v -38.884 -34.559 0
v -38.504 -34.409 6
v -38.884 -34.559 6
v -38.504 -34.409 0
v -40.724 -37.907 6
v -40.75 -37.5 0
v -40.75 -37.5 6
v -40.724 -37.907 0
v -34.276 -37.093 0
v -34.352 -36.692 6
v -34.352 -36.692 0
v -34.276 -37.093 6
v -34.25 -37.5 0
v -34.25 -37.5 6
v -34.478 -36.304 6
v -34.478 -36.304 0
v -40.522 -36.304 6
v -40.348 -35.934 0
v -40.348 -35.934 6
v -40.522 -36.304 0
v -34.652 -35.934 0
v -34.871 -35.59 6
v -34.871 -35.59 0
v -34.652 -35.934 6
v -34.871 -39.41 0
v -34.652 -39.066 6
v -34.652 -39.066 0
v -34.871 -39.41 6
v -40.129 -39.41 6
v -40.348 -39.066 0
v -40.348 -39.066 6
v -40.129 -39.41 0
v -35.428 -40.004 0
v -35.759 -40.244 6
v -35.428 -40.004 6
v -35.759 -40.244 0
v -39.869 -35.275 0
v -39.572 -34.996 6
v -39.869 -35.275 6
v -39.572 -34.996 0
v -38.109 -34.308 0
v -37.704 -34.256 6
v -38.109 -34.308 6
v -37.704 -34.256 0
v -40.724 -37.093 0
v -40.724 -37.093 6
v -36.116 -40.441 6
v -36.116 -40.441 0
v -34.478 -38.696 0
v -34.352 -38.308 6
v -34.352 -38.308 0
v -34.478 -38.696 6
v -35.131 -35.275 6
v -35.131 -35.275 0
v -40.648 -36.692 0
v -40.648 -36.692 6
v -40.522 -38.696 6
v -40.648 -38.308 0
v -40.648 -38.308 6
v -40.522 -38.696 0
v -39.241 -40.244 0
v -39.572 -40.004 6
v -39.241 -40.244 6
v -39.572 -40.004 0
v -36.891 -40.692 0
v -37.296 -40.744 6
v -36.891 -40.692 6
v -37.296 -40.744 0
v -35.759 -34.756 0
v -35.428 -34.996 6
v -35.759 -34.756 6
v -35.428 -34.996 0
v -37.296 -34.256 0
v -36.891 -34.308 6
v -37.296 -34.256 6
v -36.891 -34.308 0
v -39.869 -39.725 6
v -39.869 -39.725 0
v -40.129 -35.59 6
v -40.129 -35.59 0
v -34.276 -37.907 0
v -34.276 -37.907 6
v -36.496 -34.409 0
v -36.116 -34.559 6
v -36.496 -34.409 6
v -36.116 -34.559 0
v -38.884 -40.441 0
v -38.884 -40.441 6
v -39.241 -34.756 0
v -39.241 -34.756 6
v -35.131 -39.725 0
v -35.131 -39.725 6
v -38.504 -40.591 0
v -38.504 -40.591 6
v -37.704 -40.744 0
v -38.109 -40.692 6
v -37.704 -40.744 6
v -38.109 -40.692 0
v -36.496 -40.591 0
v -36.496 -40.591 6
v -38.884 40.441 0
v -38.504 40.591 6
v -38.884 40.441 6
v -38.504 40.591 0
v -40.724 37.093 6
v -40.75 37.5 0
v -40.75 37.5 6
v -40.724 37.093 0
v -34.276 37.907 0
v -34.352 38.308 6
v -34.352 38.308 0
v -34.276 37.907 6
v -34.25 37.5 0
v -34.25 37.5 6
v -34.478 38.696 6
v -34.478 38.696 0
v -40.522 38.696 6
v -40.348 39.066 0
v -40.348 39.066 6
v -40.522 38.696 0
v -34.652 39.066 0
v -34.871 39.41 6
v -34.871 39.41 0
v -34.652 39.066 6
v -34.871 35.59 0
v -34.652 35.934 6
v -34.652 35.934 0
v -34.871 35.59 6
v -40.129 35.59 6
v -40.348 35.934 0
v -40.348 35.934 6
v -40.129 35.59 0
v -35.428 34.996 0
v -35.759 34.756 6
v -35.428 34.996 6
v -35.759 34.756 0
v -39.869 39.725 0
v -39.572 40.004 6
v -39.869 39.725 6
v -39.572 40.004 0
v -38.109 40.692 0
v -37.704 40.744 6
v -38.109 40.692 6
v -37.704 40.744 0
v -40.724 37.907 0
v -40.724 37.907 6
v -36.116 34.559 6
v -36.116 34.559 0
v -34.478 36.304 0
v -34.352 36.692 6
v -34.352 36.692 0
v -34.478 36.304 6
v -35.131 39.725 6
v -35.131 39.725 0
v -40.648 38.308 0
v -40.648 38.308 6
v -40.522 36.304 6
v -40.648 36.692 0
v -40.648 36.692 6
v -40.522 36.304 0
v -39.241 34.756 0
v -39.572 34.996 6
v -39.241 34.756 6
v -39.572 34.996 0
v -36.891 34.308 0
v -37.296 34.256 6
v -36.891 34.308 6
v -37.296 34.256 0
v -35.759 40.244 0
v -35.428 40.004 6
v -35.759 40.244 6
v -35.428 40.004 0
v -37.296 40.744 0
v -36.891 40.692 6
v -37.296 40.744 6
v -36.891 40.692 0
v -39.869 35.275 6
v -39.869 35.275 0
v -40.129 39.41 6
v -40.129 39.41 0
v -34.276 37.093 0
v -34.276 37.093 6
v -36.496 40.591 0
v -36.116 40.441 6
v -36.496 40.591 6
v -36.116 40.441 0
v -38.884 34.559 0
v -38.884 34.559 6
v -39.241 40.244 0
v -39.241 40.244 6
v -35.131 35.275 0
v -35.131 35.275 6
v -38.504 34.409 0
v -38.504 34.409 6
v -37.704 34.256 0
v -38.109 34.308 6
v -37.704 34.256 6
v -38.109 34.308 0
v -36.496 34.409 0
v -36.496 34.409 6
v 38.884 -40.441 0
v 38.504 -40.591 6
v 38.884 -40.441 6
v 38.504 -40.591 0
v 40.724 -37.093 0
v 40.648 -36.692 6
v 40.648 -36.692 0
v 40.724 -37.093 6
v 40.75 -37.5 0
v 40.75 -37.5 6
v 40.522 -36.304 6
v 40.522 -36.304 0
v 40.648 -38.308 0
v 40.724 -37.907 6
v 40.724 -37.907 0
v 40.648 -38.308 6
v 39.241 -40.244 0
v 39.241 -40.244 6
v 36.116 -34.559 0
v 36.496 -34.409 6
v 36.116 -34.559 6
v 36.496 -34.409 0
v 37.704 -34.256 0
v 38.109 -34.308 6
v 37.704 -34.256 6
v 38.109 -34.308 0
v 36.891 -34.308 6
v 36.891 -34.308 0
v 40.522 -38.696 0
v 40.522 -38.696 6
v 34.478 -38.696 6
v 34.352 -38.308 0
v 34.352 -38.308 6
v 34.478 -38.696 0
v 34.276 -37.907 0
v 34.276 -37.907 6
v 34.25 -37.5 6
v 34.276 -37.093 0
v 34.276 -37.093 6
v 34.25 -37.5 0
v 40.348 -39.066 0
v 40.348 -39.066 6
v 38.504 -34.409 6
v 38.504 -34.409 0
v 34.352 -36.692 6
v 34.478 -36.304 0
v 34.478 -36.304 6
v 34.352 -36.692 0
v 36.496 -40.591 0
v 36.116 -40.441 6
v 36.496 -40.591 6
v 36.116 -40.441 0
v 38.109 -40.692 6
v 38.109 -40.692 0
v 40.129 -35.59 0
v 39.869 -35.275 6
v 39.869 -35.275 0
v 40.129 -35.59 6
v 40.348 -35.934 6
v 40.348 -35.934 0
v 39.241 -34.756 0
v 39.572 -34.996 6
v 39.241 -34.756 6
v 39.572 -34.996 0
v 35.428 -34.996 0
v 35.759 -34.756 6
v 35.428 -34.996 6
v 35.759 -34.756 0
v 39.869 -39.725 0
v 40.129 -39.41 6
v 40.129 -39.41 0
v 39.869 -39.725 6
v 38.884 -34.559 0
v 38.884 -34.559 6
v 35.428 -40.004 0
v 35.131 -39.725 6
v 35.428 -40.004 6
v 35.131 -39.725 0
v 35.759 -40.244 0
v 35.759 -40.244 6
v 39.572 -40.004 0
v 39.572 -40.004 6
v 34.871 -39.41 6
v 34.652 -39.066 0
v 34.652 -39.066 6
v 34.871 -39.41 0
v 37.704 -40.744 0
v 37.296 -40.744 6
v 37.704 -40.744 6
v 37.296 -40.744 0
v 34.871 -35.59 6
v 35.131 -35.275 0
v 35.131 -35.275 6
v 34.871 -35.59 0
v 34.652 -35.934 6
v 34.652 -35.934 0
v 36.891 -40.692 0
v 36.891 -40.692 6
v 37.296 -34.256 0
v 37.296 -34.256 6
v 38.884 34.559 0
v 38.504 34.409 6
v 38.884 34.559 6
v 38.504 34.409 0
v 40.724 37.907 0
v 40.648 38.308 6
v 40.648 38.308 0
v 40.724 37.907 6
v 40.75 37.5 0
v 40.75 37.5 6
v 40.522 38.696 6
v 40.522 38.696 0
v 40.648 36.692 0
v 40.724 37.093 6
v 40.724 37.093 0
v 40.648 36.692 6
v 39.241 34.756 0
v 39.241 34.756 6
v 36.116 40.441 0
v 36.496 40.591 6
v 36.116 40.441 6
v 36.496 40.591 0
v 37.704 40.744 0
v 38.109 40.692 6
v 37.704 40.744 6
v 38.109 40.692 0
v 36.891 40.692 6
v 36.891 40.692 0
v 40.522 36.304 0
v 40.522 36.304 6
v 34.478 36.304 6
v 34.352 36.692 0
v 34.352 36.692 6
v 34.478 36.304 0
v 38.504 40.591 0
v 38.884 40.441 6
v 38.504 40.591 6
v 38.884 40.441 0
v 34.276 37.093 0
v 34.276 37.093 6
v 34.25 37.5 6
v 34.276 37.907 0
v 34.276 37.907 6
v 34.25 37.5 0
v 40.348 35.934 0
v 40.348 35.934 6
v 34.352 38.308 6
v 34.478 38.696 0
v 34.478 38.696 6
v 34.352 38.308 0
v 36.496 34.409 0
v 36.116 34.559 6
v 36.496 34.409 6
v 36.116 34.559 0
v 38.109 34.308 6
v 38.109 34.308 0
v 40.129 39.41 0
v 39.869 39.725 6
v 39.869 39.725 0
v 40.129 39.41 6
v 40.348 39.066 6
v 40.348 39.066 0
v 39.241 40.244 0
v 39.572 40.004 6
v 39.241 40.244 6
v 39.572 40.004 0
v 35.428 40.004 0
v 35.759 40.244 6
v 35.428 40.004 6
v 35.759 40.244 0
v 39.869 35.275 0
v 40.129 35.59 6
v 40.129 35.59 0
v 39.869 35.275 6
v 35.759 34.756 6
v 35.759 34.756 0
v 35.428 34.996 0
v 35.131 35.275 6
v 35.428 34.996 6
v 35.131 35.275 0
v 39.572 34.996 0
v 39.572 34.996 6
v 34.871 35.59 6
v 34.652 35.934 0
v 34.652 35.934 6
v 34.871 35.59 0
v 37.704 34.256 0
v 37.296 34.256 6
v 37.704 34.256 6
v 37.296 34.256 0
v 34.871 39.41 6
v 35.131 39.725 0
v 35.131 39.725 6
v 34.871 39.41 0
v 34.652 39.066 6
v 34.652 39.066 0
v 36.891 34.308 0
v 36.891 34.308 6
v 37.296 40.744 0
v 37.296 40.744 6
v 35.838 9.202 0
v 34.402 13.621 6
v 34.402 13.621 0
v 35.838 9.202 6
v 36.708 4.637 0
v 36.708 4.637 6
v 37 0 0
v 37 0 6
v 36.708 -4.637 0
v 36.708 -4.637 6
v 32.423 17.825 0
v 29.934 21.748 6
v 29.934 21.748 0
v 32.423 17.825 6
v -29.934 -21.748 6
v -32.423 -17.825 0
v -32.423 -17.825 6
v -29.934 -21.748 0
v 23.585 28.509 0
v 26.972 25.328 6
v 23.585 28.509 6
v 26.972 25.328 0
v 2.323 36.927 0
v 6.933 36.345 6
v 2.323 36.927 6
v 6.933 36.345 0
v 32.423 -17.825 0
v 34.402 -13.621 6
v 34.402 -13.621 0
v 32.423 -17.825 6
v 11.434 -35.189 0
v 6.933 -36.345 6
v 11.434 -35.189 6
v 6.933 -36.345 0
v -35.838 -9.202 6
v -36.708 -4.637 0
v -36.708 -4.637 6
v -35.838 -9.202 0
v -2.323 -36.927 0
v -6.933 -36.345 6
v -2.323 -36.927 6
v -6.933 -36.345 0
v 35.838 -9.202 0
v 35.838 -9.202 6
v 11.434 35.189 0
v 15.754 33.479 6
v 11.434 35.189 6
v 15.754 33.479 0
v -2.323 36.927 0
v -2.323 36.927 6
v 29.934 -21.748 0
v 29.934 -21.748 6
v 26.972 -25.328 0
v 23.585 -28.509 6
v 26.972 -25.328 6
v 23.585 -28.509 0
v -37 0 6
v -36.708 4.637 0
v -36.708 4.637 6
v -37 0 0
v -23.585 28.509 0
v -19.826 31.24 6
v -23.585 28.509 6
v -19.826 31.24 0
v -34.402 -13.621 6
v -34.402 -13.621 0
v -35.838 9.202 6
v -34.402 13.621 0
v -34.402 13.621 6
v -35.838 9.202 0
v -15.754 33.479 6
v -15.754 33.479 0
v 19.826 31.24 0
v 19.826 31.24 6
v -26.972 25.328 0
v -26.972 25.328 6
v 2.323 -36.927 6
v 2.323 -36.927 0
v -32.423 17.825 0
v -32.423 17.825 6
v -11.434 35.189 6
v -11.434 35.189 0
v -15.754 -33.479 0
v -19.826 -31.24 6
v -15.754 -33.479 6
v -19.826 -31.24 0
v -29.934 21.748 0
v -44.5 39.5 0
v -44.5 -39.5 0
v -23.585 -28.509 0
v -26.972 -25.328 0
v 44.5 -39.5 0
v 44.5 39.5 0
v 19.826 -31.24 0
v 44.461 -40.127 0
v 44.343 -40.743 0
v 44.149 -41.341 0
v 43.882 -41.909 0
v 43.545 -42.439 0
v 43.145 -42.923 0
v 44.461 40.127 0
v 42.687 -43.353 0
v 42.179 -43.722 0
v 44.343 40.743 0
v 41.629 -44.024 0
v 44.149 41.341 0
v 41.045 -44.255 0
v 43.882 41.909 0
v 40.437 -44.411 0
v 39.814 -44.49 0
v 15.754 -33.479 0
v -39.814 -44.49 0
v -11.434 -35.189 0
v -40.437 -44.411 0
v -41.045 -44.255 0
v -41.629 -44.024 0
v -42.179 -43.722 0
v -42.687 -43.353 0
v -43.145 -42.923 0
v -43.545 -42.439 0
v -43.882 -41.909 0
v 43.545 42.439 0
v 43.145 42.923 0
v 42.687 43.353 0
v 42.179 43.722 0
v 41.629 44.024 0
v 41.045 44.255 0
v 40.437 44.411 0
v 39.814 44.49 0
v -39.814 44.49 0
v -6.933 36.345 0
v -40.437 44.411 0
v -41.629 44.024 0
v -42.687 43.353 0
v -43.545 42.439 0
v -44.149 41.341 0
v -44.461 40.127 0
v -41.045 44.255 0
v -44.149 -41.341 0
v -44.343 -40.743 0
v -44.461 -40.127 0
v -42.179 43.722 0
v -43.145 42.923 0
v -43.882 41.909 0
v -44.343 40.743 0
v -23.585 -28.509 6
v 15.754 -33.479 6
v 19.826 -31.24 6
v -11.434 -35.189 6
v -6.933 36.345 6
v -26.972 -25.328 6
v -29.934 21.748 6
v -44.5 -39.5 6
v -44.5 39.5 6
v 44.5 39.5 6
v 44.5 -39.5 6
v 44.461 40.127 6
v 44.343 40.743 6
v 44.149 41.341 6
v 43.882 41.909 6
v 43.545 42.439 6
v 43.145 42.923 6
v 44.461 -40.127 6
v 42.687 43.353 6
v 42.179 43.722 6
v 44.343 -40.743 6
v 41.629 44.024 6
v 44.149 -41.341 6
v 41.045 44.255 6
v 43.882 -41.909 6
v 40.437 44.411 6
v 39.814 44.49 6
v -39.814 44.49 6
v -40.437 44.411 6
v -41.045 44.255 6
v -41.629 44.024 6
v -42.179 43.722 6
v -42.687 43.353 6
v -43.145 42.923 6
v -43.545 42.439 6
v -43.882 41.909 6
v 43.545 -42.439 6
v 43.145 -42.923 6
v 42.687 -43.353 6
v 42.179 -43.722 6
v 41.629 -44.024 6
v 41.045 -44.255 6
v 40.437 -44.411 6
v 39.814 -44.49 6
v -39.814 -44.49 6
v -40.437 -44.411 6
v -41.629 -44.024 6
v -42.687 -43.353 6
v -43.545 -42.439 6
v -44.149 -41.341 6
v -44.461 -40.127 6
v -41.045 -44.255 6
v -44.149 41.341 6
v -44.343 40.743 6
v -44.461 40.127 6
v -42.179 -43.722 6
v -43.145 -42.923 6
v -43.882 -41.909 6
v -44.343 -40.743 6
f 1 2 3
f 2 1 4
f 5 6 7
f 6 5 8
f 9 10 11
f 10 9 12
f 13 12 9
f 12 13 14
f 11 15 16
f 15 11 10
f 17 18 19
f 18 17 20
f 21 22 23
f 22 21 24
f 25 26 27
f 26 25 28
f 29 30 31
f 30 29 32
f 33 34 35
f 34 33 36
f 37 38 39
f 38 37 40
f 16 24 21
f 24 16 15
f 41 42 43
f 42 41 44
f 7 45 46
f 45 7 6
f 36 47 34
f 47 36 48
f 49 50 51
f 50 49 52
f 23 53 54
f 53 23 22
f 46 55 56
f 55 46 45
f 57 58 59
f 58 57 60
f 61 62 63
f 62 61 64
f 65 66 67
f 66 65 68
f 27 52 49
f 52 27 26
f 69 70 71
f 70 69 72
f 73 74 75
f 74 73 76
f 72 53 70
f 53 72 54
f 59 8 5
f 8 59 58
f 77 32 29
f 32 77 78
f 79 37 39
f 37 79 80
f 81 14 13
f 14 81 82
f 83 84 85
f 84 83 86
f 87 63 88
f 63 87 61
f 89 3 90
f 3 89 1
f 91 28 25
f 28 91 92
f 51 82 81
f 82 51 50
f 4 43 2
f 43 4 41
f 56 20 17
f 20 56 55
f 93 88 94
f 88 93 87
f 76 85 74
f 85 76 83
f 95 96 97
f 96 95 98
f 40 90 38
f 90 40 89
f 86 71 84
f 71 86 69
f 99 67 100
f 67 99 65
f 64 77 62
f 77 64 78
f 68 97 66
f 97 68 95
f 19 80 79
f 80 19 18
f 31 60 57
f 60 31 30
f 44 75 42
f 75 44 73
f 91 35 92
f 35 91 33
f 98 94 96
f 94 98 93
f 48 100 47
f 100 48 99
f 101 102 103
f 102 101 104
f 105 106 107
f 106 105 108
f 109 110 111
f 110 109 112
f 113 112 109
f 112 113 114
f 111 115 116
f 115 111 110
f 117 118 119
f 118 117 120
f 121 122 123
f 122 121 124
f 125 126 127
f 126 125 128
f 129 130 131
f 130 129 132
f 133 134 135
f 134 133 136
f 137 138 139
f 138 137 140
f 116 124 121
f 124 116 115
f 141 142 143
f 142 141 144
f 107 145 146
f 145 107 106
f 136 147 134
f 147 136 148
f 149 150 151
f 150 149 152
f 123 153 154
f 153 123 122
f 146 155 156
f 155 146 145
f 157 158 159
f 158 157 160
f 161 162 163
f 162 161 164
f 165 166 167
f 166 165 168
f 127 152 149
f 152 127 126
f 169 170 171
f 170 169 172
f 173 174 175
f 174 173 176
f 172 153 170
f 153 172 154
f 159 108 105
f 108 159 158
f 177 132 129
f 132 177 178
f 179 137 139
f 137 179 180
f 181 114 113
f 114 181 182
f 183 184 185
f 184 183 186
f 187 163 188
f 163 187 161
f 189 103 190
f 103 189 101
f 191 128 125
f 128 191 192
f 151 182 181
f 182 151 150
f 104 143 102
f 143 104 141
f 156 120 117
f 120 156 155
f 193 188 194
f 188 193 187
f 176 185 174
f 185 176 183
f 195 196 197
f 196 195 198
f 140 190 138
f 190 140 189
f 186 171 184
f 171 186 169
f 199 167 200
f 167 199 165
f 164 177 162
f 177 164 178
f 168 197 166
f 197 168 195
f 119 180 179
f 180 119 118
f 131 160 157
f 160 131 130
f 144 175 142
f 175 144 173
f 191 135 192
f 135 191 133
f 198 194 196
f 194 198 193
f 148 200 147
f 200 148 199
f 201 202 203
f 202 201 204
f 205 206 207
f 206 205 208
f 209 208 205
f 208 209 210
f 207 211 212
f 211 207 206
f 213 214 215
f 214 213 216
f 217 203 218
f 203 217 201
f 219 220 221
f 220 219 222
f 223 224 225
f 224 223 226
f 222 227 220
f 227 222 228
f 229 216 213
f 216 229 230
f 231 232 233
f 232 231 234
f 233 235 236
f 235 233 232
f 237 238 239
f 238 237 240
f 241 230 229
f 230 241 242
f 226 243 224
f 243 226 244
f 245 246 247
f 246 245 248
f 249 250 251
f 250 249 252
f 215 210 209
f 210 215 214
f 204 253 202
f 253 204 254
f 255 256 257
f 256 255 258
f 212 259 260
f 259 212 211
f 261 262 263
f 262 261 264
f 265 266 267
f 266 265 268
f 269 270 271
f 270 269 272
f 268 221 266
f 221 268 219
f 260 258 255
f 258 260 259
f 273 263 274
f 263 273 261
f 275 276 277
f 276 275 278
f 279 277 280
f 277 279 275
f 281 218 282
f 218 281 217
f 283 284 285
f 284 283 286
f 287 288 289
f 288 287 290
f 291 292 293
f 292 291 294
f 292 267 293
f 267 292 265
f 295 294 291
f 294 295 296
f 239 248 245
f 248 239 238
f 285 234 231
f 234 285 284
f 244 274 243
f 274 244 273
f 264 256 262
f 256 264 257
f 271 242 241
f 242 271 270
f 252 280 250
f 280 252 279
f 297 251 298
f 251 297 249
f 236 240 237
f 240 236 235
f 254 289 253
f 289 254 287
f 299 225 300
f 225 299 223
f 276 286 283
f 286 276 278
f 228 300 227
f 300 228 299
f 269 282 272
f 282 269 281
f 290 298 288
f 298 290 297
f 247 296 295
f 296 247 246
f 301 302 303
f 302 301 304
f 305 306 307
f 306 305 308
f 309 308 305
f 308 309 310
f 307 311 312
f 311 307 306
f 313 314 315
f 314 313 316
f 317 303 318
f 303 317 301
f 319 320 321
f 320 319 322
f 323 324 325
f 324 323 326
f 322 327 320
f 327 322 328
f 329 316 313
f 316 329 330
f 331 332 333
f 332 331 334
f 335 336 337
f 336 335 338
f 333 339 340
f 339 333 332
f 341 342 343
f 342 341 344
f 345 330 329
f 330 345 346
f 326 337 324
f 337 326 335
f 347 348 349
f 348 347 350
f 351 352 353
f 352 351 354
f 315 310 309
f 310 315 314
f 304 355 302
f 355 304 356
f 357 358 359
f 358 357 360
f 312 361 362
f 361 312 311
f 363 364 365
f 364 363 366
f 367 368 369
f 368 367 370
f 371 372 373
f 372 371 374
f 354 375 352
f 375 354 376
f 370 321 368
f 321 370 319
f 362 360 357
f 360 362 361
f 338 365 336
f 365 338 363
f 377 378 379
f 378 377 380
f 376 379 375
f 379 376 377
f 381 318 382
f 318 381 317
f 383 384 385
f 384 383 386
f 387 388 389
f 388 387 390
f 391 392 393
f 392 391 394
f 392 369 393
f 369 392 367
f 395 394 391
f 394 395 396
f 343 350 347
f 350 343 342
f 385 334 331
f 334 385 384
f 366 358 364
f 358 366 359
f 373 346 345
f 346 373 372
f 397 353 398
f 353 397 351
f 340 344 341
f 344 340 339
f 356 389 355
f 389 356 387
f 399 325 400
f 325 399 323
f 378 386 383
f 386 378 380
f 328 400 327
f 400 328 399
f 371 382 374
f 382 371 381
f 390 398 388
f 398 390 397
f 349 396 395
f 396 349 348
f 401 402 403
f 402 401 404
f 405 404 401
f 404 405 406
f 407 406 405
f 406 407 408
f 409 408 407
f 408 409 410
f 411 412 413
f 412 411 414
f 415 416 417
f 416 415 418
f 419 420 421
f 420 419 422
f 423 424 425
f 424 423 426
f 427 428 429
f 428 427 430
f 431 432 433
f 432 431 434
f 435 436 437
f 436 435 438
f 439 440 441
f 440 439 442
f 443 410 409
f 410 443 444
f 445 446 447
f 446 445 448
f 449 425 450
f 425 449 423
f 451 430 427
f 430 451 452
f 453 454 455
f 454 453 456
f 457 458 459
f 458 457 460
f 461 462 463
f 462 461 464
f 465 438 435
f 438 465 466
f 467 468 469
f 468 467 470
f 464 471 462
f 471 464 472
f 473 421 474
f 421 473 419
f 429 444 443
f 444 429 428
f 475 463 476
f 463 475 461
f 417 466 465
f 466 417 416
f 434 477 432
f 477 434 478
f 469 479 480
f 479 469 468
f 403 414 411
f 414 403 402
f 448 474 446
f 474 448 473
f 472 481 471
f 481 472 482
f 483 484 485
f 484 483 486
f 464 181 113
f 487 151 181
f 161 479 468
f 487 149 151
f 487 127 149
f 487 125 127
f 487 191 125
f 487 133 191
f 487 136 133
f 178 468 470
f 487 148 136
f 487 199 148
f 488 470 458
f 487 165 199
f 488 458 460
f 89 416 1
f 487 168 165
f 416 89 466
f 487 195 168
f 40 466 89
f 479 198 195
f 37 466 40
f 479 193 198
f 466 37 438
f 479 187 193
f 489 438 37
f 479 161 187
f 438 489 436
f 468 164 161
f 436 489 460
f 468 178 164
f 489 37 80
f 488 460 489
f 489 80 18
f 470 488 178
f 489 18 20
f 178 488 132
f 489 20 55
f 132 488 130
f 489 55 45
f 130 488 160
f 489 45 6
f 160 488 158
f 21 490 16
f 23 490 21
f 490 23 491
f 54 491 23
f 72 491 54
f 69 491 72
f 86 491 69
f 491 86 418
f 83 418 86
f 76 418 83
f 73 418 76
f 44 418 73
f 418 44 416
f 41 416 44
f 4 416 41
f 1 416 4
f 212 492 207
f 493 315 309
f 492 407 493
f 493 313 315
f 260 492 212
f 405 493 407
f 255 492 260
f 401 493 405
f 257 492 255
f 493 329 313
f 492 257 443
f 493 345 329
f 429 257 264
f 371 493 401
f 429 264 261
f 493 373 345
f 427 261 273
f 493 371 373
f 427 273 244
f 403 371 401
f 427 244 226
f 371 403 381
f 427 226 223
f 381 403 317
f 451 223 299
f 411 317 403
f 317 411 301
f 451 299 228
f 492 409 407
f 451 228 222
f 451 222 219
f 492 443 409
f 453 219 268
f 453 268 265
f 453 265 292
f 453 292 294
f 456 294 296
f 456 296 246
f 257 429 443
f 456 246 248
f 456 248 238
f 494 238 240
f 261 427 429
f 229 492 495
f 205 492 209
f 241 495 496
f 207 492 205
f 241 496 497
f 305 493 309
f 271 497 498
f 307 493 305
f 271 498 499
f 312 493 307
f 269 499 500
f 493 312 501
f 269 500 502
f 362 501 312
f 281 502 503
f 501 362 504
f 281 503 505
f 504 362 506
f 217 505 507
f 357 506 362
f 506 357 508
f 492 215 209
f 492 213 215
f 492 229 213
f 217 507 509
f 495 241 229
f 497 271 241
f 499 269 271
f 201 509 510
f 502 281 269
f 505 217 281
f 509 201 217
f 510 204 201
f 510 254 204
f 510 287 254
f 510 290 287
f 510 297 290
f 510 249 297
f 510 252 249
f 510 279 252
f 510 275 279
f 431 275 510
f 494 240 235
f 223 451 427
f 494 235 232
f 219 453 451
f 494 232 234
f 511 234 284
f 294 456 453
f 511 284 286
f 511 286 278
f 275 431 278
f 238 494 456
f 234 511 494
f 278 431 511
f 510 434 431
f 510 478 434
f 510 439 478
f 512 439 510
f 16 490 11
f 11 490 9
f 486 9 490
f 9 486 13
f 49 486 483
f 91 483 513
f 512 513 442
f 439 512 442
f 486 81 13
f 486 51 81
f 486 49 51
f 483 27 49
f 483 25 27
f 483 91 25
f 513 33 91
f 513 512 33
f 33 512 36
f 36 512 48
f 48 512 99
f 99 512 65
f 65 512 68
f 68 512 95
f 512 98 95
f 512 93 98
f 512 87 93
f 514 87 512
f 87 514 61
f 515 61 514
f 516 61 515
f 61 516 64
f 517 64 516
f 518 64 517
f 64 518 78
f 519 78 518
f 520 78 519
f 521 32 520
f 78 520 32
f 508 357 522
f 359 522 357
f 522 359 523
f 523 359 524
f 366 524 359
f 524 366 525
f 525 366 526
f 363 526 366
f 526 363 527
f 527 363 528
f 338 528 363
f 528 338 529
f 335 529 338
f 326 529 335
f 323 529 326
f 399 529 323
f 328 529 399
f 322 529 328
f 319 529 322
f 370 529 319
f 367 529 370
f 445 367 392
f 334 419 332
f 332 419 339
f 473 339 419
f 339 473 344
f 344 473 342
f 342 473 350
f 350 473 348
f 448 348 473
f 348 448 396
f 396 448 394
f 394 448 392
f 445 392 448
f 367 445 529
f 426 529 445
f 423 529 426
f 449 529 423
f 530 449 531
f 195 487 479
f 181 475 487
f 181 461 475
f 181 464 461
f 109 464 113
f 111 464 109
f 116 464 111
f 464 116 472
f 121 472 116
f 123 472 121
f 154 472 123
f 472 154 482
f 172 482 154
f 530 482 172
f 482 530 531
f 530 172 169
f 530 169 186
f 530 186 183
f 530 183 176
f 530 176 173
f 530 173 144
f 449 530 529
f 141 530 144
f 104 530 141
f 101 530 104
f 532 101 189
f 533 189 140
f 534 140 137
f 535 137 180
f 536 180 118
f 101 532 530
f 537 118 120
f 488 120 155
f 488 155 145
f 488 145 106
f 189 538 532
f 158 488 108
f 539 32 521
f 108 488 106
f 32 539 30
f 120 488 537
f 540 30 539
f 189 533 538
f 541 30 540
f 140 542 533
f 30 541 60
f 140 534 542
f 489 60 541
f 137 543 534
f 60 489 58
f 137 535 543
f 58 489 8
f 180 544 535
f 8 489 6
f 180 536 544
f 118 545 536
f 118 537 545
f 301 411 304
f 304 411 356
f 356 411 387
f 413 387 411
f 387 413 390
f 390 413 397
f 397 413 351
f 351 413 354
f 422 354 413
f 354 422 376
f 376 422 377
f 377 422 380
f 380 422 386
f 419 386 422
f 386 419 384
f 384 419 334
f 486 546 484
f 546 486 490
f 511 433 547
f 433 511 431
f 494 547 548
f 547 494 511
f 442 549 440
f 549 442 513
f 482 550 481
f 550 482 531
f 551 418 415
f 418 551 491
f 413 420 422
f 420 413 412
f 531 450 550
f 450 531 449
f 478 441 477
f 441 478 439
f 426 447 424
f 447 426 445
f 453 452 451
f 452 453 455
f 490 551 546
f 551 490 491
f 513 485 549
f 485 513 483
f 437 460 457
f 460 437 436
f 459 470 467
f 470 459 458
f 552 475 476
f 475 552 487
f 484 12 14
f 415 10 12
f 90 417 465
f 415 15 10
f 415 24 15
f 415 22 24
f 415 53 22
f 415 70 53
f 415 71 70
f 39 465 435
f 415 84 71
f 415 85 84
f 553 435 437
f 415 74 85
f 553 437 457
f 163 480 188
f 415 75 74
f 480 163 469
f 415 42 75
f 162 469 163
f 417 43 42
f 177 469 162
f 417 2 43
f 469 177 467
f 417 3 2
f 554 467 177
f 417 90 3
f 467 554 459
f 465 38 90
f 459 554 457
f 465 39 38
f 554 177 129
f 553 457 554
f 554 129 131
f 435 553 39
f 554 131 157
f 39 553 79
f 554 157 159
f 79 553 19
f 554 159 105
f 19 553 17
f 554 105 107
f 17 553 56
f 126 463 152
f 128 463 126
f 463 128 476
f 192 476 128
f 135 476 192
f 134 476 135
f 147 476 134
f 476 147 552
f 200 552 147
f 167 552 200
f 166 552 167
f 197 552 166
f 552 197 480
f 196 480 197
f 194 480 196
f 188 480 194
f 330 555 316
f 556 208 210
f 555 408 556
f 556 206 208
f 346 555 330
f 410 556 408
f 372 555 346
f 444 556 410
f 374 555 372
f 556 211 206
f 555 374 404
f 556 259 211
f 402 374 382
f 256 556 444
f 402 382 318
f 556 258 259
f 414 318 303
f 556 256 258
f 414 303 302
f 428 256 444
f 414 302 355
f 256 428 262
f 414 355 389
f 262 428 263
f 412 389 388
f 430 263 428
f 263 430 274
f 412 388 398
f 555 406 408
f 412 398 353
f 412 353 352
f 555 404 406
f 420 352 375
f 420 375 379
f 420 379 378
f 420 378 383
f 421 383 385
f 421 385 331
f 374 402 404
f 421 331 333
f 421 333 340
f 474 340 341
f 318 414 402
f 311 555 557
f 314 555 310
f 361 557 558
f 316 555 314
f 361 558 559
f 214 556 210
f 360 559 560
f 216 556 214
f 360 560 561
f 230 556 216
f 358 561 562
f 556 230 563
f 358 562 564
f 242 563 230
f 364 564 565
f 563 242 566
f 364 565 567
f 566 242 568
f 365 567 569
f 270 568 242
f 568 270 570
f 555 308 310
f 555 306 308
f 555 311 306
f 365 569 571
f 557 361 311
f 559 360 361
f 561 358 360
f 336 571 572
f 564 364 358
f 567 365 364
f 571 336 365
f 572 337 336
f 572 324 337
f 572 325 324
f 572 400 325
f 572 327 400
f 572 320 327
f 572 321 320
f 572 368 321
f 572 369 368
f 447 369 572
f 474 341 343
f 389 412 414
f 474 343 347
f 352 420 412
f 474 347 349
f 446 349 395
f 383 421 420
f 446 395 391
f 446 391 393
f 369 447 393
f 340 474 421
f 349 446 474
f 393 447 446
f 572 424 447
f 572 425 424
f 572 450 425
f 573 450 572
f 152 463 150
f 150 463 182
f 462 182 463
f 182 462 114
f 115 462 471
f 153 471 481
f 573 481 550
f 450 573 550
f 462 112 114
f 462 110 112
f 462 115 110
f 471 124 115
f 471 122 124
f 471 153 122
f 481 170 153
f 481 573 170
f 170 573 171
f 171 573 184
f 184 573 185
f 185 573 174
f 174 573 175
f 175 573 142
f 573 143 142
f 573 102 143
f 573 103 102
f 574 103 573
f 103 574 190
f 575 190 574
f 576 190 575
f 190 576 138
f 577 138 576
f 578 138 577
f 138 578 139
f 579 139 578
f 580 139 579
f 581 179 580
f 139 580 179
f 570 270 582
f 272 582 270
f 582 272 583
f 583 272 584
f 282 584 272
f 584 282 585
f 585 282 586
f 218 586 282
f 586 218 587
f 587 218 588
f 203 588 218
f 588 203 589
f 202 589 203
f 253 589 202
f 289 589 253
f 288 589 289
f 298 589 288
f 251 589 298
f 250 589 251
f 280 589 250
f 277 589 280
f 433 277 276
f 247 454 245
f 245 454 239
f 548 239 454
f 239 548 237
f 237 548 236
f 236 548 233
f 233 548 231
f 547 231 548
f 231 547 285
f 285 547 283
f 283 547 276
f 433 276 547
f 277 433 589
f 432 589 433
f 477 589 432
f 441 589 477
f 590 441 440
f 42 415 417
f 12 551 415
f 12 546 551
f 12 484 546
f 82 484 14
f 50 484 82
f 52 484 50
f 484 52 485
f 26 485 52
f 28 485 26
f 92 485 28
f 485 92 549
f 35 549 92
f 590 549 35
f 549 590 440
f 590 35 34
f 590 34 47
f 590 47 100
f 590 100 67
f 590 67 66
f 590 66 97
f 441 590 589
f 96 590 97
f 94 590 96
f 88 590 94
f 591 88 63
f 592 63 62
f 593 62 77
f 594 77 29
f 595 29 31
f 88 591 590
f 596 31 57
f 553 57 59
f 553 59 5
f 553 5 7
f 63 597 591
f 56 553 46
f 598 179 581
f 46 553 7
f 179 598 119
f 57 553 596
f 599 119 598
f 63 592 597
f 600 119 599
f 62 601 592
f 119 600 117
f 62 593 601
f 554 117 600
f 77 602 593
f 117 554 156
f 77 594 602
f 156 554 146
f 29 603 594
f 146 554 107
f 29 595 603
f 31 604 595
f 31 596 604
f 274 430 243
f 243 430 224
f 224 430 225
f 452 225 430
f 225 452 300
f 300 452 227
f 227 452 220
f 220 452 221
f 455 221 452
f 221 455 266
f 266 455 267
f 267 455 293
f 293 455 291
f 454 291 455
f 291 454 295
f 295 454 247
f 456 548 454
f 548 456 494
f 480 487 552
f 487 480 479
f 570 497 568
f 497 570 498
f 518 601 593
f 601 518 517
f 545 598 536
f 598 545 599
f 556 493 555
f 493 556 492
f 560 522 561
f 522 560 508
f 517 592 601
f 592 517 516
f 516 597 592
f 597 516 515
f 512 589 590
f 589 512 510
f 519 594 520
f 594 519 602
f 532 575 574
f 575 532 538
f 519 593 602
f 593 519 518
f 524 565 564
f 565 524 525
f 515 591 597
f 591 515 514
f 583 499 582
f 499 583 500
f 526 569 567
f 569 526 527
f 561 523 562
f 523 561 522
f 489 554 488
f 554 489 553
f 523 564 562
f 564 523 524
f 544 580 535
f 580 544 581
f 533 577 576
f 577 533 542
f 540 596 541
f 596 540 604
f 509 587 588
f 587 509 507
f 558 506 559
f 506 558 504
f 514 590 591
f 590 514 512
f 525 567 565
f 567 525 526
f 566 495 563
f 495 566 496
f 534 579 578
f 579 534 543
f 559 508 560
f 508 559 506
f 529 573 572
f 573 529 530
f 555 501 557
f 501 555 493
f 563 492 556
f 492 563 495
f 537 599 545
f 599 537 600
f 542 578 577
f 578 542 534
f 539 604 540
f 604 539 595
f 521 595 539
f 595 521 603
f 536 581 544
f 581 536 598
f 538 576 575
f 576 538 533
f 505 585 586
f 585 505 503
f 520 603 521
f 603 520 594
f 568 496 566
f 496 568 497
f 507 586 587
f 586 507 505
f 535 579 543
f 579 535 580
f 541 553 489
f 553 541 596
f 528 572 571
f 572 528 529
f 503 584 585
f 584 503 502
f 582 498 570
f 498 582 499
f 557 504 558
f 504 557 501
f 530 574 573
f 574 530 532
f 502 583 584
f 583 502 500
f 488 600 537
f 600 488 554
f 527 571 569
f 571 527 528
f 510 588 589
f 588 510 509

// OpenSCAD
$fn = 50;


difference() {
	union() {
		hull() {
			translate(v = [-39.5000000000, 39.5000000000, 0]) {
				cylinder(h = 6, r = 5);
			}
			translate(v = [39.5000000000, 39.5000000000, 0]) {
				cylinder(h = 6, r = 5);
			}
			translate(v = [-39.5000000000, -39.5000000000, 0]) {
				cylinder(h = 6, r = 5);
			}
			translate(v = [39.5000000000, -39.5000000000, 0]) {
				cylinder(h = 6, r = 5);
			}
		}
	}
	union() {
		#translate(v = [-37.5000000000, -37.5000000000, -100.0000000000]) {
			cylinder(h = 200, r = 3.2500000000);
		}
		#translate(v = [-37.5000000000, 37.5000000000, -100.0000000000]) {
			cylinder(h = 200, r = 3.2500000000);
		}
		#translate(v = [37.5000000000, -37.5000000000, -100.0000000000]) {
			cylinder(h = 200, r = 3.2500000000);
		}
		#translate(v = [37.5000000000, 37.5000000000, -100.0000000000]) {
			cylinder(h = 200, r = 3.2500000000);
		}
		#cylinder(h = 6, r = 37.0000000000);
	}
}
